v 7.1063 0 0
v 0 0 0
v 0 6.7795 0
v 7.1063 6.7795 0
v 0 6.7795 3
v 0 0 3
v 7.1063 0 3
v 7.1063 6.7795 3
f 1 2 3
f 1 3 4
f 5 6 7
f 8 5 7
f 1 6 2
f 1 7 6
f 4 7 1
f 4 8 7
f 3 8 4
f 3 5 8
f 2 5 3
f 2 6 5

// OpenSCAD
// get a single number

colors = ["#cb6b6b","#dd7d7d","#9e3333","#842020"];



single_rand = rands(5,10,1)[0];
single_rand2 = rands(5,10,1)[0];

index_color = rands(0,3,1)[0];

color(colors[index_color])
linear_extrude(height = 3){
square([single_rand,single_rand2]);
}
